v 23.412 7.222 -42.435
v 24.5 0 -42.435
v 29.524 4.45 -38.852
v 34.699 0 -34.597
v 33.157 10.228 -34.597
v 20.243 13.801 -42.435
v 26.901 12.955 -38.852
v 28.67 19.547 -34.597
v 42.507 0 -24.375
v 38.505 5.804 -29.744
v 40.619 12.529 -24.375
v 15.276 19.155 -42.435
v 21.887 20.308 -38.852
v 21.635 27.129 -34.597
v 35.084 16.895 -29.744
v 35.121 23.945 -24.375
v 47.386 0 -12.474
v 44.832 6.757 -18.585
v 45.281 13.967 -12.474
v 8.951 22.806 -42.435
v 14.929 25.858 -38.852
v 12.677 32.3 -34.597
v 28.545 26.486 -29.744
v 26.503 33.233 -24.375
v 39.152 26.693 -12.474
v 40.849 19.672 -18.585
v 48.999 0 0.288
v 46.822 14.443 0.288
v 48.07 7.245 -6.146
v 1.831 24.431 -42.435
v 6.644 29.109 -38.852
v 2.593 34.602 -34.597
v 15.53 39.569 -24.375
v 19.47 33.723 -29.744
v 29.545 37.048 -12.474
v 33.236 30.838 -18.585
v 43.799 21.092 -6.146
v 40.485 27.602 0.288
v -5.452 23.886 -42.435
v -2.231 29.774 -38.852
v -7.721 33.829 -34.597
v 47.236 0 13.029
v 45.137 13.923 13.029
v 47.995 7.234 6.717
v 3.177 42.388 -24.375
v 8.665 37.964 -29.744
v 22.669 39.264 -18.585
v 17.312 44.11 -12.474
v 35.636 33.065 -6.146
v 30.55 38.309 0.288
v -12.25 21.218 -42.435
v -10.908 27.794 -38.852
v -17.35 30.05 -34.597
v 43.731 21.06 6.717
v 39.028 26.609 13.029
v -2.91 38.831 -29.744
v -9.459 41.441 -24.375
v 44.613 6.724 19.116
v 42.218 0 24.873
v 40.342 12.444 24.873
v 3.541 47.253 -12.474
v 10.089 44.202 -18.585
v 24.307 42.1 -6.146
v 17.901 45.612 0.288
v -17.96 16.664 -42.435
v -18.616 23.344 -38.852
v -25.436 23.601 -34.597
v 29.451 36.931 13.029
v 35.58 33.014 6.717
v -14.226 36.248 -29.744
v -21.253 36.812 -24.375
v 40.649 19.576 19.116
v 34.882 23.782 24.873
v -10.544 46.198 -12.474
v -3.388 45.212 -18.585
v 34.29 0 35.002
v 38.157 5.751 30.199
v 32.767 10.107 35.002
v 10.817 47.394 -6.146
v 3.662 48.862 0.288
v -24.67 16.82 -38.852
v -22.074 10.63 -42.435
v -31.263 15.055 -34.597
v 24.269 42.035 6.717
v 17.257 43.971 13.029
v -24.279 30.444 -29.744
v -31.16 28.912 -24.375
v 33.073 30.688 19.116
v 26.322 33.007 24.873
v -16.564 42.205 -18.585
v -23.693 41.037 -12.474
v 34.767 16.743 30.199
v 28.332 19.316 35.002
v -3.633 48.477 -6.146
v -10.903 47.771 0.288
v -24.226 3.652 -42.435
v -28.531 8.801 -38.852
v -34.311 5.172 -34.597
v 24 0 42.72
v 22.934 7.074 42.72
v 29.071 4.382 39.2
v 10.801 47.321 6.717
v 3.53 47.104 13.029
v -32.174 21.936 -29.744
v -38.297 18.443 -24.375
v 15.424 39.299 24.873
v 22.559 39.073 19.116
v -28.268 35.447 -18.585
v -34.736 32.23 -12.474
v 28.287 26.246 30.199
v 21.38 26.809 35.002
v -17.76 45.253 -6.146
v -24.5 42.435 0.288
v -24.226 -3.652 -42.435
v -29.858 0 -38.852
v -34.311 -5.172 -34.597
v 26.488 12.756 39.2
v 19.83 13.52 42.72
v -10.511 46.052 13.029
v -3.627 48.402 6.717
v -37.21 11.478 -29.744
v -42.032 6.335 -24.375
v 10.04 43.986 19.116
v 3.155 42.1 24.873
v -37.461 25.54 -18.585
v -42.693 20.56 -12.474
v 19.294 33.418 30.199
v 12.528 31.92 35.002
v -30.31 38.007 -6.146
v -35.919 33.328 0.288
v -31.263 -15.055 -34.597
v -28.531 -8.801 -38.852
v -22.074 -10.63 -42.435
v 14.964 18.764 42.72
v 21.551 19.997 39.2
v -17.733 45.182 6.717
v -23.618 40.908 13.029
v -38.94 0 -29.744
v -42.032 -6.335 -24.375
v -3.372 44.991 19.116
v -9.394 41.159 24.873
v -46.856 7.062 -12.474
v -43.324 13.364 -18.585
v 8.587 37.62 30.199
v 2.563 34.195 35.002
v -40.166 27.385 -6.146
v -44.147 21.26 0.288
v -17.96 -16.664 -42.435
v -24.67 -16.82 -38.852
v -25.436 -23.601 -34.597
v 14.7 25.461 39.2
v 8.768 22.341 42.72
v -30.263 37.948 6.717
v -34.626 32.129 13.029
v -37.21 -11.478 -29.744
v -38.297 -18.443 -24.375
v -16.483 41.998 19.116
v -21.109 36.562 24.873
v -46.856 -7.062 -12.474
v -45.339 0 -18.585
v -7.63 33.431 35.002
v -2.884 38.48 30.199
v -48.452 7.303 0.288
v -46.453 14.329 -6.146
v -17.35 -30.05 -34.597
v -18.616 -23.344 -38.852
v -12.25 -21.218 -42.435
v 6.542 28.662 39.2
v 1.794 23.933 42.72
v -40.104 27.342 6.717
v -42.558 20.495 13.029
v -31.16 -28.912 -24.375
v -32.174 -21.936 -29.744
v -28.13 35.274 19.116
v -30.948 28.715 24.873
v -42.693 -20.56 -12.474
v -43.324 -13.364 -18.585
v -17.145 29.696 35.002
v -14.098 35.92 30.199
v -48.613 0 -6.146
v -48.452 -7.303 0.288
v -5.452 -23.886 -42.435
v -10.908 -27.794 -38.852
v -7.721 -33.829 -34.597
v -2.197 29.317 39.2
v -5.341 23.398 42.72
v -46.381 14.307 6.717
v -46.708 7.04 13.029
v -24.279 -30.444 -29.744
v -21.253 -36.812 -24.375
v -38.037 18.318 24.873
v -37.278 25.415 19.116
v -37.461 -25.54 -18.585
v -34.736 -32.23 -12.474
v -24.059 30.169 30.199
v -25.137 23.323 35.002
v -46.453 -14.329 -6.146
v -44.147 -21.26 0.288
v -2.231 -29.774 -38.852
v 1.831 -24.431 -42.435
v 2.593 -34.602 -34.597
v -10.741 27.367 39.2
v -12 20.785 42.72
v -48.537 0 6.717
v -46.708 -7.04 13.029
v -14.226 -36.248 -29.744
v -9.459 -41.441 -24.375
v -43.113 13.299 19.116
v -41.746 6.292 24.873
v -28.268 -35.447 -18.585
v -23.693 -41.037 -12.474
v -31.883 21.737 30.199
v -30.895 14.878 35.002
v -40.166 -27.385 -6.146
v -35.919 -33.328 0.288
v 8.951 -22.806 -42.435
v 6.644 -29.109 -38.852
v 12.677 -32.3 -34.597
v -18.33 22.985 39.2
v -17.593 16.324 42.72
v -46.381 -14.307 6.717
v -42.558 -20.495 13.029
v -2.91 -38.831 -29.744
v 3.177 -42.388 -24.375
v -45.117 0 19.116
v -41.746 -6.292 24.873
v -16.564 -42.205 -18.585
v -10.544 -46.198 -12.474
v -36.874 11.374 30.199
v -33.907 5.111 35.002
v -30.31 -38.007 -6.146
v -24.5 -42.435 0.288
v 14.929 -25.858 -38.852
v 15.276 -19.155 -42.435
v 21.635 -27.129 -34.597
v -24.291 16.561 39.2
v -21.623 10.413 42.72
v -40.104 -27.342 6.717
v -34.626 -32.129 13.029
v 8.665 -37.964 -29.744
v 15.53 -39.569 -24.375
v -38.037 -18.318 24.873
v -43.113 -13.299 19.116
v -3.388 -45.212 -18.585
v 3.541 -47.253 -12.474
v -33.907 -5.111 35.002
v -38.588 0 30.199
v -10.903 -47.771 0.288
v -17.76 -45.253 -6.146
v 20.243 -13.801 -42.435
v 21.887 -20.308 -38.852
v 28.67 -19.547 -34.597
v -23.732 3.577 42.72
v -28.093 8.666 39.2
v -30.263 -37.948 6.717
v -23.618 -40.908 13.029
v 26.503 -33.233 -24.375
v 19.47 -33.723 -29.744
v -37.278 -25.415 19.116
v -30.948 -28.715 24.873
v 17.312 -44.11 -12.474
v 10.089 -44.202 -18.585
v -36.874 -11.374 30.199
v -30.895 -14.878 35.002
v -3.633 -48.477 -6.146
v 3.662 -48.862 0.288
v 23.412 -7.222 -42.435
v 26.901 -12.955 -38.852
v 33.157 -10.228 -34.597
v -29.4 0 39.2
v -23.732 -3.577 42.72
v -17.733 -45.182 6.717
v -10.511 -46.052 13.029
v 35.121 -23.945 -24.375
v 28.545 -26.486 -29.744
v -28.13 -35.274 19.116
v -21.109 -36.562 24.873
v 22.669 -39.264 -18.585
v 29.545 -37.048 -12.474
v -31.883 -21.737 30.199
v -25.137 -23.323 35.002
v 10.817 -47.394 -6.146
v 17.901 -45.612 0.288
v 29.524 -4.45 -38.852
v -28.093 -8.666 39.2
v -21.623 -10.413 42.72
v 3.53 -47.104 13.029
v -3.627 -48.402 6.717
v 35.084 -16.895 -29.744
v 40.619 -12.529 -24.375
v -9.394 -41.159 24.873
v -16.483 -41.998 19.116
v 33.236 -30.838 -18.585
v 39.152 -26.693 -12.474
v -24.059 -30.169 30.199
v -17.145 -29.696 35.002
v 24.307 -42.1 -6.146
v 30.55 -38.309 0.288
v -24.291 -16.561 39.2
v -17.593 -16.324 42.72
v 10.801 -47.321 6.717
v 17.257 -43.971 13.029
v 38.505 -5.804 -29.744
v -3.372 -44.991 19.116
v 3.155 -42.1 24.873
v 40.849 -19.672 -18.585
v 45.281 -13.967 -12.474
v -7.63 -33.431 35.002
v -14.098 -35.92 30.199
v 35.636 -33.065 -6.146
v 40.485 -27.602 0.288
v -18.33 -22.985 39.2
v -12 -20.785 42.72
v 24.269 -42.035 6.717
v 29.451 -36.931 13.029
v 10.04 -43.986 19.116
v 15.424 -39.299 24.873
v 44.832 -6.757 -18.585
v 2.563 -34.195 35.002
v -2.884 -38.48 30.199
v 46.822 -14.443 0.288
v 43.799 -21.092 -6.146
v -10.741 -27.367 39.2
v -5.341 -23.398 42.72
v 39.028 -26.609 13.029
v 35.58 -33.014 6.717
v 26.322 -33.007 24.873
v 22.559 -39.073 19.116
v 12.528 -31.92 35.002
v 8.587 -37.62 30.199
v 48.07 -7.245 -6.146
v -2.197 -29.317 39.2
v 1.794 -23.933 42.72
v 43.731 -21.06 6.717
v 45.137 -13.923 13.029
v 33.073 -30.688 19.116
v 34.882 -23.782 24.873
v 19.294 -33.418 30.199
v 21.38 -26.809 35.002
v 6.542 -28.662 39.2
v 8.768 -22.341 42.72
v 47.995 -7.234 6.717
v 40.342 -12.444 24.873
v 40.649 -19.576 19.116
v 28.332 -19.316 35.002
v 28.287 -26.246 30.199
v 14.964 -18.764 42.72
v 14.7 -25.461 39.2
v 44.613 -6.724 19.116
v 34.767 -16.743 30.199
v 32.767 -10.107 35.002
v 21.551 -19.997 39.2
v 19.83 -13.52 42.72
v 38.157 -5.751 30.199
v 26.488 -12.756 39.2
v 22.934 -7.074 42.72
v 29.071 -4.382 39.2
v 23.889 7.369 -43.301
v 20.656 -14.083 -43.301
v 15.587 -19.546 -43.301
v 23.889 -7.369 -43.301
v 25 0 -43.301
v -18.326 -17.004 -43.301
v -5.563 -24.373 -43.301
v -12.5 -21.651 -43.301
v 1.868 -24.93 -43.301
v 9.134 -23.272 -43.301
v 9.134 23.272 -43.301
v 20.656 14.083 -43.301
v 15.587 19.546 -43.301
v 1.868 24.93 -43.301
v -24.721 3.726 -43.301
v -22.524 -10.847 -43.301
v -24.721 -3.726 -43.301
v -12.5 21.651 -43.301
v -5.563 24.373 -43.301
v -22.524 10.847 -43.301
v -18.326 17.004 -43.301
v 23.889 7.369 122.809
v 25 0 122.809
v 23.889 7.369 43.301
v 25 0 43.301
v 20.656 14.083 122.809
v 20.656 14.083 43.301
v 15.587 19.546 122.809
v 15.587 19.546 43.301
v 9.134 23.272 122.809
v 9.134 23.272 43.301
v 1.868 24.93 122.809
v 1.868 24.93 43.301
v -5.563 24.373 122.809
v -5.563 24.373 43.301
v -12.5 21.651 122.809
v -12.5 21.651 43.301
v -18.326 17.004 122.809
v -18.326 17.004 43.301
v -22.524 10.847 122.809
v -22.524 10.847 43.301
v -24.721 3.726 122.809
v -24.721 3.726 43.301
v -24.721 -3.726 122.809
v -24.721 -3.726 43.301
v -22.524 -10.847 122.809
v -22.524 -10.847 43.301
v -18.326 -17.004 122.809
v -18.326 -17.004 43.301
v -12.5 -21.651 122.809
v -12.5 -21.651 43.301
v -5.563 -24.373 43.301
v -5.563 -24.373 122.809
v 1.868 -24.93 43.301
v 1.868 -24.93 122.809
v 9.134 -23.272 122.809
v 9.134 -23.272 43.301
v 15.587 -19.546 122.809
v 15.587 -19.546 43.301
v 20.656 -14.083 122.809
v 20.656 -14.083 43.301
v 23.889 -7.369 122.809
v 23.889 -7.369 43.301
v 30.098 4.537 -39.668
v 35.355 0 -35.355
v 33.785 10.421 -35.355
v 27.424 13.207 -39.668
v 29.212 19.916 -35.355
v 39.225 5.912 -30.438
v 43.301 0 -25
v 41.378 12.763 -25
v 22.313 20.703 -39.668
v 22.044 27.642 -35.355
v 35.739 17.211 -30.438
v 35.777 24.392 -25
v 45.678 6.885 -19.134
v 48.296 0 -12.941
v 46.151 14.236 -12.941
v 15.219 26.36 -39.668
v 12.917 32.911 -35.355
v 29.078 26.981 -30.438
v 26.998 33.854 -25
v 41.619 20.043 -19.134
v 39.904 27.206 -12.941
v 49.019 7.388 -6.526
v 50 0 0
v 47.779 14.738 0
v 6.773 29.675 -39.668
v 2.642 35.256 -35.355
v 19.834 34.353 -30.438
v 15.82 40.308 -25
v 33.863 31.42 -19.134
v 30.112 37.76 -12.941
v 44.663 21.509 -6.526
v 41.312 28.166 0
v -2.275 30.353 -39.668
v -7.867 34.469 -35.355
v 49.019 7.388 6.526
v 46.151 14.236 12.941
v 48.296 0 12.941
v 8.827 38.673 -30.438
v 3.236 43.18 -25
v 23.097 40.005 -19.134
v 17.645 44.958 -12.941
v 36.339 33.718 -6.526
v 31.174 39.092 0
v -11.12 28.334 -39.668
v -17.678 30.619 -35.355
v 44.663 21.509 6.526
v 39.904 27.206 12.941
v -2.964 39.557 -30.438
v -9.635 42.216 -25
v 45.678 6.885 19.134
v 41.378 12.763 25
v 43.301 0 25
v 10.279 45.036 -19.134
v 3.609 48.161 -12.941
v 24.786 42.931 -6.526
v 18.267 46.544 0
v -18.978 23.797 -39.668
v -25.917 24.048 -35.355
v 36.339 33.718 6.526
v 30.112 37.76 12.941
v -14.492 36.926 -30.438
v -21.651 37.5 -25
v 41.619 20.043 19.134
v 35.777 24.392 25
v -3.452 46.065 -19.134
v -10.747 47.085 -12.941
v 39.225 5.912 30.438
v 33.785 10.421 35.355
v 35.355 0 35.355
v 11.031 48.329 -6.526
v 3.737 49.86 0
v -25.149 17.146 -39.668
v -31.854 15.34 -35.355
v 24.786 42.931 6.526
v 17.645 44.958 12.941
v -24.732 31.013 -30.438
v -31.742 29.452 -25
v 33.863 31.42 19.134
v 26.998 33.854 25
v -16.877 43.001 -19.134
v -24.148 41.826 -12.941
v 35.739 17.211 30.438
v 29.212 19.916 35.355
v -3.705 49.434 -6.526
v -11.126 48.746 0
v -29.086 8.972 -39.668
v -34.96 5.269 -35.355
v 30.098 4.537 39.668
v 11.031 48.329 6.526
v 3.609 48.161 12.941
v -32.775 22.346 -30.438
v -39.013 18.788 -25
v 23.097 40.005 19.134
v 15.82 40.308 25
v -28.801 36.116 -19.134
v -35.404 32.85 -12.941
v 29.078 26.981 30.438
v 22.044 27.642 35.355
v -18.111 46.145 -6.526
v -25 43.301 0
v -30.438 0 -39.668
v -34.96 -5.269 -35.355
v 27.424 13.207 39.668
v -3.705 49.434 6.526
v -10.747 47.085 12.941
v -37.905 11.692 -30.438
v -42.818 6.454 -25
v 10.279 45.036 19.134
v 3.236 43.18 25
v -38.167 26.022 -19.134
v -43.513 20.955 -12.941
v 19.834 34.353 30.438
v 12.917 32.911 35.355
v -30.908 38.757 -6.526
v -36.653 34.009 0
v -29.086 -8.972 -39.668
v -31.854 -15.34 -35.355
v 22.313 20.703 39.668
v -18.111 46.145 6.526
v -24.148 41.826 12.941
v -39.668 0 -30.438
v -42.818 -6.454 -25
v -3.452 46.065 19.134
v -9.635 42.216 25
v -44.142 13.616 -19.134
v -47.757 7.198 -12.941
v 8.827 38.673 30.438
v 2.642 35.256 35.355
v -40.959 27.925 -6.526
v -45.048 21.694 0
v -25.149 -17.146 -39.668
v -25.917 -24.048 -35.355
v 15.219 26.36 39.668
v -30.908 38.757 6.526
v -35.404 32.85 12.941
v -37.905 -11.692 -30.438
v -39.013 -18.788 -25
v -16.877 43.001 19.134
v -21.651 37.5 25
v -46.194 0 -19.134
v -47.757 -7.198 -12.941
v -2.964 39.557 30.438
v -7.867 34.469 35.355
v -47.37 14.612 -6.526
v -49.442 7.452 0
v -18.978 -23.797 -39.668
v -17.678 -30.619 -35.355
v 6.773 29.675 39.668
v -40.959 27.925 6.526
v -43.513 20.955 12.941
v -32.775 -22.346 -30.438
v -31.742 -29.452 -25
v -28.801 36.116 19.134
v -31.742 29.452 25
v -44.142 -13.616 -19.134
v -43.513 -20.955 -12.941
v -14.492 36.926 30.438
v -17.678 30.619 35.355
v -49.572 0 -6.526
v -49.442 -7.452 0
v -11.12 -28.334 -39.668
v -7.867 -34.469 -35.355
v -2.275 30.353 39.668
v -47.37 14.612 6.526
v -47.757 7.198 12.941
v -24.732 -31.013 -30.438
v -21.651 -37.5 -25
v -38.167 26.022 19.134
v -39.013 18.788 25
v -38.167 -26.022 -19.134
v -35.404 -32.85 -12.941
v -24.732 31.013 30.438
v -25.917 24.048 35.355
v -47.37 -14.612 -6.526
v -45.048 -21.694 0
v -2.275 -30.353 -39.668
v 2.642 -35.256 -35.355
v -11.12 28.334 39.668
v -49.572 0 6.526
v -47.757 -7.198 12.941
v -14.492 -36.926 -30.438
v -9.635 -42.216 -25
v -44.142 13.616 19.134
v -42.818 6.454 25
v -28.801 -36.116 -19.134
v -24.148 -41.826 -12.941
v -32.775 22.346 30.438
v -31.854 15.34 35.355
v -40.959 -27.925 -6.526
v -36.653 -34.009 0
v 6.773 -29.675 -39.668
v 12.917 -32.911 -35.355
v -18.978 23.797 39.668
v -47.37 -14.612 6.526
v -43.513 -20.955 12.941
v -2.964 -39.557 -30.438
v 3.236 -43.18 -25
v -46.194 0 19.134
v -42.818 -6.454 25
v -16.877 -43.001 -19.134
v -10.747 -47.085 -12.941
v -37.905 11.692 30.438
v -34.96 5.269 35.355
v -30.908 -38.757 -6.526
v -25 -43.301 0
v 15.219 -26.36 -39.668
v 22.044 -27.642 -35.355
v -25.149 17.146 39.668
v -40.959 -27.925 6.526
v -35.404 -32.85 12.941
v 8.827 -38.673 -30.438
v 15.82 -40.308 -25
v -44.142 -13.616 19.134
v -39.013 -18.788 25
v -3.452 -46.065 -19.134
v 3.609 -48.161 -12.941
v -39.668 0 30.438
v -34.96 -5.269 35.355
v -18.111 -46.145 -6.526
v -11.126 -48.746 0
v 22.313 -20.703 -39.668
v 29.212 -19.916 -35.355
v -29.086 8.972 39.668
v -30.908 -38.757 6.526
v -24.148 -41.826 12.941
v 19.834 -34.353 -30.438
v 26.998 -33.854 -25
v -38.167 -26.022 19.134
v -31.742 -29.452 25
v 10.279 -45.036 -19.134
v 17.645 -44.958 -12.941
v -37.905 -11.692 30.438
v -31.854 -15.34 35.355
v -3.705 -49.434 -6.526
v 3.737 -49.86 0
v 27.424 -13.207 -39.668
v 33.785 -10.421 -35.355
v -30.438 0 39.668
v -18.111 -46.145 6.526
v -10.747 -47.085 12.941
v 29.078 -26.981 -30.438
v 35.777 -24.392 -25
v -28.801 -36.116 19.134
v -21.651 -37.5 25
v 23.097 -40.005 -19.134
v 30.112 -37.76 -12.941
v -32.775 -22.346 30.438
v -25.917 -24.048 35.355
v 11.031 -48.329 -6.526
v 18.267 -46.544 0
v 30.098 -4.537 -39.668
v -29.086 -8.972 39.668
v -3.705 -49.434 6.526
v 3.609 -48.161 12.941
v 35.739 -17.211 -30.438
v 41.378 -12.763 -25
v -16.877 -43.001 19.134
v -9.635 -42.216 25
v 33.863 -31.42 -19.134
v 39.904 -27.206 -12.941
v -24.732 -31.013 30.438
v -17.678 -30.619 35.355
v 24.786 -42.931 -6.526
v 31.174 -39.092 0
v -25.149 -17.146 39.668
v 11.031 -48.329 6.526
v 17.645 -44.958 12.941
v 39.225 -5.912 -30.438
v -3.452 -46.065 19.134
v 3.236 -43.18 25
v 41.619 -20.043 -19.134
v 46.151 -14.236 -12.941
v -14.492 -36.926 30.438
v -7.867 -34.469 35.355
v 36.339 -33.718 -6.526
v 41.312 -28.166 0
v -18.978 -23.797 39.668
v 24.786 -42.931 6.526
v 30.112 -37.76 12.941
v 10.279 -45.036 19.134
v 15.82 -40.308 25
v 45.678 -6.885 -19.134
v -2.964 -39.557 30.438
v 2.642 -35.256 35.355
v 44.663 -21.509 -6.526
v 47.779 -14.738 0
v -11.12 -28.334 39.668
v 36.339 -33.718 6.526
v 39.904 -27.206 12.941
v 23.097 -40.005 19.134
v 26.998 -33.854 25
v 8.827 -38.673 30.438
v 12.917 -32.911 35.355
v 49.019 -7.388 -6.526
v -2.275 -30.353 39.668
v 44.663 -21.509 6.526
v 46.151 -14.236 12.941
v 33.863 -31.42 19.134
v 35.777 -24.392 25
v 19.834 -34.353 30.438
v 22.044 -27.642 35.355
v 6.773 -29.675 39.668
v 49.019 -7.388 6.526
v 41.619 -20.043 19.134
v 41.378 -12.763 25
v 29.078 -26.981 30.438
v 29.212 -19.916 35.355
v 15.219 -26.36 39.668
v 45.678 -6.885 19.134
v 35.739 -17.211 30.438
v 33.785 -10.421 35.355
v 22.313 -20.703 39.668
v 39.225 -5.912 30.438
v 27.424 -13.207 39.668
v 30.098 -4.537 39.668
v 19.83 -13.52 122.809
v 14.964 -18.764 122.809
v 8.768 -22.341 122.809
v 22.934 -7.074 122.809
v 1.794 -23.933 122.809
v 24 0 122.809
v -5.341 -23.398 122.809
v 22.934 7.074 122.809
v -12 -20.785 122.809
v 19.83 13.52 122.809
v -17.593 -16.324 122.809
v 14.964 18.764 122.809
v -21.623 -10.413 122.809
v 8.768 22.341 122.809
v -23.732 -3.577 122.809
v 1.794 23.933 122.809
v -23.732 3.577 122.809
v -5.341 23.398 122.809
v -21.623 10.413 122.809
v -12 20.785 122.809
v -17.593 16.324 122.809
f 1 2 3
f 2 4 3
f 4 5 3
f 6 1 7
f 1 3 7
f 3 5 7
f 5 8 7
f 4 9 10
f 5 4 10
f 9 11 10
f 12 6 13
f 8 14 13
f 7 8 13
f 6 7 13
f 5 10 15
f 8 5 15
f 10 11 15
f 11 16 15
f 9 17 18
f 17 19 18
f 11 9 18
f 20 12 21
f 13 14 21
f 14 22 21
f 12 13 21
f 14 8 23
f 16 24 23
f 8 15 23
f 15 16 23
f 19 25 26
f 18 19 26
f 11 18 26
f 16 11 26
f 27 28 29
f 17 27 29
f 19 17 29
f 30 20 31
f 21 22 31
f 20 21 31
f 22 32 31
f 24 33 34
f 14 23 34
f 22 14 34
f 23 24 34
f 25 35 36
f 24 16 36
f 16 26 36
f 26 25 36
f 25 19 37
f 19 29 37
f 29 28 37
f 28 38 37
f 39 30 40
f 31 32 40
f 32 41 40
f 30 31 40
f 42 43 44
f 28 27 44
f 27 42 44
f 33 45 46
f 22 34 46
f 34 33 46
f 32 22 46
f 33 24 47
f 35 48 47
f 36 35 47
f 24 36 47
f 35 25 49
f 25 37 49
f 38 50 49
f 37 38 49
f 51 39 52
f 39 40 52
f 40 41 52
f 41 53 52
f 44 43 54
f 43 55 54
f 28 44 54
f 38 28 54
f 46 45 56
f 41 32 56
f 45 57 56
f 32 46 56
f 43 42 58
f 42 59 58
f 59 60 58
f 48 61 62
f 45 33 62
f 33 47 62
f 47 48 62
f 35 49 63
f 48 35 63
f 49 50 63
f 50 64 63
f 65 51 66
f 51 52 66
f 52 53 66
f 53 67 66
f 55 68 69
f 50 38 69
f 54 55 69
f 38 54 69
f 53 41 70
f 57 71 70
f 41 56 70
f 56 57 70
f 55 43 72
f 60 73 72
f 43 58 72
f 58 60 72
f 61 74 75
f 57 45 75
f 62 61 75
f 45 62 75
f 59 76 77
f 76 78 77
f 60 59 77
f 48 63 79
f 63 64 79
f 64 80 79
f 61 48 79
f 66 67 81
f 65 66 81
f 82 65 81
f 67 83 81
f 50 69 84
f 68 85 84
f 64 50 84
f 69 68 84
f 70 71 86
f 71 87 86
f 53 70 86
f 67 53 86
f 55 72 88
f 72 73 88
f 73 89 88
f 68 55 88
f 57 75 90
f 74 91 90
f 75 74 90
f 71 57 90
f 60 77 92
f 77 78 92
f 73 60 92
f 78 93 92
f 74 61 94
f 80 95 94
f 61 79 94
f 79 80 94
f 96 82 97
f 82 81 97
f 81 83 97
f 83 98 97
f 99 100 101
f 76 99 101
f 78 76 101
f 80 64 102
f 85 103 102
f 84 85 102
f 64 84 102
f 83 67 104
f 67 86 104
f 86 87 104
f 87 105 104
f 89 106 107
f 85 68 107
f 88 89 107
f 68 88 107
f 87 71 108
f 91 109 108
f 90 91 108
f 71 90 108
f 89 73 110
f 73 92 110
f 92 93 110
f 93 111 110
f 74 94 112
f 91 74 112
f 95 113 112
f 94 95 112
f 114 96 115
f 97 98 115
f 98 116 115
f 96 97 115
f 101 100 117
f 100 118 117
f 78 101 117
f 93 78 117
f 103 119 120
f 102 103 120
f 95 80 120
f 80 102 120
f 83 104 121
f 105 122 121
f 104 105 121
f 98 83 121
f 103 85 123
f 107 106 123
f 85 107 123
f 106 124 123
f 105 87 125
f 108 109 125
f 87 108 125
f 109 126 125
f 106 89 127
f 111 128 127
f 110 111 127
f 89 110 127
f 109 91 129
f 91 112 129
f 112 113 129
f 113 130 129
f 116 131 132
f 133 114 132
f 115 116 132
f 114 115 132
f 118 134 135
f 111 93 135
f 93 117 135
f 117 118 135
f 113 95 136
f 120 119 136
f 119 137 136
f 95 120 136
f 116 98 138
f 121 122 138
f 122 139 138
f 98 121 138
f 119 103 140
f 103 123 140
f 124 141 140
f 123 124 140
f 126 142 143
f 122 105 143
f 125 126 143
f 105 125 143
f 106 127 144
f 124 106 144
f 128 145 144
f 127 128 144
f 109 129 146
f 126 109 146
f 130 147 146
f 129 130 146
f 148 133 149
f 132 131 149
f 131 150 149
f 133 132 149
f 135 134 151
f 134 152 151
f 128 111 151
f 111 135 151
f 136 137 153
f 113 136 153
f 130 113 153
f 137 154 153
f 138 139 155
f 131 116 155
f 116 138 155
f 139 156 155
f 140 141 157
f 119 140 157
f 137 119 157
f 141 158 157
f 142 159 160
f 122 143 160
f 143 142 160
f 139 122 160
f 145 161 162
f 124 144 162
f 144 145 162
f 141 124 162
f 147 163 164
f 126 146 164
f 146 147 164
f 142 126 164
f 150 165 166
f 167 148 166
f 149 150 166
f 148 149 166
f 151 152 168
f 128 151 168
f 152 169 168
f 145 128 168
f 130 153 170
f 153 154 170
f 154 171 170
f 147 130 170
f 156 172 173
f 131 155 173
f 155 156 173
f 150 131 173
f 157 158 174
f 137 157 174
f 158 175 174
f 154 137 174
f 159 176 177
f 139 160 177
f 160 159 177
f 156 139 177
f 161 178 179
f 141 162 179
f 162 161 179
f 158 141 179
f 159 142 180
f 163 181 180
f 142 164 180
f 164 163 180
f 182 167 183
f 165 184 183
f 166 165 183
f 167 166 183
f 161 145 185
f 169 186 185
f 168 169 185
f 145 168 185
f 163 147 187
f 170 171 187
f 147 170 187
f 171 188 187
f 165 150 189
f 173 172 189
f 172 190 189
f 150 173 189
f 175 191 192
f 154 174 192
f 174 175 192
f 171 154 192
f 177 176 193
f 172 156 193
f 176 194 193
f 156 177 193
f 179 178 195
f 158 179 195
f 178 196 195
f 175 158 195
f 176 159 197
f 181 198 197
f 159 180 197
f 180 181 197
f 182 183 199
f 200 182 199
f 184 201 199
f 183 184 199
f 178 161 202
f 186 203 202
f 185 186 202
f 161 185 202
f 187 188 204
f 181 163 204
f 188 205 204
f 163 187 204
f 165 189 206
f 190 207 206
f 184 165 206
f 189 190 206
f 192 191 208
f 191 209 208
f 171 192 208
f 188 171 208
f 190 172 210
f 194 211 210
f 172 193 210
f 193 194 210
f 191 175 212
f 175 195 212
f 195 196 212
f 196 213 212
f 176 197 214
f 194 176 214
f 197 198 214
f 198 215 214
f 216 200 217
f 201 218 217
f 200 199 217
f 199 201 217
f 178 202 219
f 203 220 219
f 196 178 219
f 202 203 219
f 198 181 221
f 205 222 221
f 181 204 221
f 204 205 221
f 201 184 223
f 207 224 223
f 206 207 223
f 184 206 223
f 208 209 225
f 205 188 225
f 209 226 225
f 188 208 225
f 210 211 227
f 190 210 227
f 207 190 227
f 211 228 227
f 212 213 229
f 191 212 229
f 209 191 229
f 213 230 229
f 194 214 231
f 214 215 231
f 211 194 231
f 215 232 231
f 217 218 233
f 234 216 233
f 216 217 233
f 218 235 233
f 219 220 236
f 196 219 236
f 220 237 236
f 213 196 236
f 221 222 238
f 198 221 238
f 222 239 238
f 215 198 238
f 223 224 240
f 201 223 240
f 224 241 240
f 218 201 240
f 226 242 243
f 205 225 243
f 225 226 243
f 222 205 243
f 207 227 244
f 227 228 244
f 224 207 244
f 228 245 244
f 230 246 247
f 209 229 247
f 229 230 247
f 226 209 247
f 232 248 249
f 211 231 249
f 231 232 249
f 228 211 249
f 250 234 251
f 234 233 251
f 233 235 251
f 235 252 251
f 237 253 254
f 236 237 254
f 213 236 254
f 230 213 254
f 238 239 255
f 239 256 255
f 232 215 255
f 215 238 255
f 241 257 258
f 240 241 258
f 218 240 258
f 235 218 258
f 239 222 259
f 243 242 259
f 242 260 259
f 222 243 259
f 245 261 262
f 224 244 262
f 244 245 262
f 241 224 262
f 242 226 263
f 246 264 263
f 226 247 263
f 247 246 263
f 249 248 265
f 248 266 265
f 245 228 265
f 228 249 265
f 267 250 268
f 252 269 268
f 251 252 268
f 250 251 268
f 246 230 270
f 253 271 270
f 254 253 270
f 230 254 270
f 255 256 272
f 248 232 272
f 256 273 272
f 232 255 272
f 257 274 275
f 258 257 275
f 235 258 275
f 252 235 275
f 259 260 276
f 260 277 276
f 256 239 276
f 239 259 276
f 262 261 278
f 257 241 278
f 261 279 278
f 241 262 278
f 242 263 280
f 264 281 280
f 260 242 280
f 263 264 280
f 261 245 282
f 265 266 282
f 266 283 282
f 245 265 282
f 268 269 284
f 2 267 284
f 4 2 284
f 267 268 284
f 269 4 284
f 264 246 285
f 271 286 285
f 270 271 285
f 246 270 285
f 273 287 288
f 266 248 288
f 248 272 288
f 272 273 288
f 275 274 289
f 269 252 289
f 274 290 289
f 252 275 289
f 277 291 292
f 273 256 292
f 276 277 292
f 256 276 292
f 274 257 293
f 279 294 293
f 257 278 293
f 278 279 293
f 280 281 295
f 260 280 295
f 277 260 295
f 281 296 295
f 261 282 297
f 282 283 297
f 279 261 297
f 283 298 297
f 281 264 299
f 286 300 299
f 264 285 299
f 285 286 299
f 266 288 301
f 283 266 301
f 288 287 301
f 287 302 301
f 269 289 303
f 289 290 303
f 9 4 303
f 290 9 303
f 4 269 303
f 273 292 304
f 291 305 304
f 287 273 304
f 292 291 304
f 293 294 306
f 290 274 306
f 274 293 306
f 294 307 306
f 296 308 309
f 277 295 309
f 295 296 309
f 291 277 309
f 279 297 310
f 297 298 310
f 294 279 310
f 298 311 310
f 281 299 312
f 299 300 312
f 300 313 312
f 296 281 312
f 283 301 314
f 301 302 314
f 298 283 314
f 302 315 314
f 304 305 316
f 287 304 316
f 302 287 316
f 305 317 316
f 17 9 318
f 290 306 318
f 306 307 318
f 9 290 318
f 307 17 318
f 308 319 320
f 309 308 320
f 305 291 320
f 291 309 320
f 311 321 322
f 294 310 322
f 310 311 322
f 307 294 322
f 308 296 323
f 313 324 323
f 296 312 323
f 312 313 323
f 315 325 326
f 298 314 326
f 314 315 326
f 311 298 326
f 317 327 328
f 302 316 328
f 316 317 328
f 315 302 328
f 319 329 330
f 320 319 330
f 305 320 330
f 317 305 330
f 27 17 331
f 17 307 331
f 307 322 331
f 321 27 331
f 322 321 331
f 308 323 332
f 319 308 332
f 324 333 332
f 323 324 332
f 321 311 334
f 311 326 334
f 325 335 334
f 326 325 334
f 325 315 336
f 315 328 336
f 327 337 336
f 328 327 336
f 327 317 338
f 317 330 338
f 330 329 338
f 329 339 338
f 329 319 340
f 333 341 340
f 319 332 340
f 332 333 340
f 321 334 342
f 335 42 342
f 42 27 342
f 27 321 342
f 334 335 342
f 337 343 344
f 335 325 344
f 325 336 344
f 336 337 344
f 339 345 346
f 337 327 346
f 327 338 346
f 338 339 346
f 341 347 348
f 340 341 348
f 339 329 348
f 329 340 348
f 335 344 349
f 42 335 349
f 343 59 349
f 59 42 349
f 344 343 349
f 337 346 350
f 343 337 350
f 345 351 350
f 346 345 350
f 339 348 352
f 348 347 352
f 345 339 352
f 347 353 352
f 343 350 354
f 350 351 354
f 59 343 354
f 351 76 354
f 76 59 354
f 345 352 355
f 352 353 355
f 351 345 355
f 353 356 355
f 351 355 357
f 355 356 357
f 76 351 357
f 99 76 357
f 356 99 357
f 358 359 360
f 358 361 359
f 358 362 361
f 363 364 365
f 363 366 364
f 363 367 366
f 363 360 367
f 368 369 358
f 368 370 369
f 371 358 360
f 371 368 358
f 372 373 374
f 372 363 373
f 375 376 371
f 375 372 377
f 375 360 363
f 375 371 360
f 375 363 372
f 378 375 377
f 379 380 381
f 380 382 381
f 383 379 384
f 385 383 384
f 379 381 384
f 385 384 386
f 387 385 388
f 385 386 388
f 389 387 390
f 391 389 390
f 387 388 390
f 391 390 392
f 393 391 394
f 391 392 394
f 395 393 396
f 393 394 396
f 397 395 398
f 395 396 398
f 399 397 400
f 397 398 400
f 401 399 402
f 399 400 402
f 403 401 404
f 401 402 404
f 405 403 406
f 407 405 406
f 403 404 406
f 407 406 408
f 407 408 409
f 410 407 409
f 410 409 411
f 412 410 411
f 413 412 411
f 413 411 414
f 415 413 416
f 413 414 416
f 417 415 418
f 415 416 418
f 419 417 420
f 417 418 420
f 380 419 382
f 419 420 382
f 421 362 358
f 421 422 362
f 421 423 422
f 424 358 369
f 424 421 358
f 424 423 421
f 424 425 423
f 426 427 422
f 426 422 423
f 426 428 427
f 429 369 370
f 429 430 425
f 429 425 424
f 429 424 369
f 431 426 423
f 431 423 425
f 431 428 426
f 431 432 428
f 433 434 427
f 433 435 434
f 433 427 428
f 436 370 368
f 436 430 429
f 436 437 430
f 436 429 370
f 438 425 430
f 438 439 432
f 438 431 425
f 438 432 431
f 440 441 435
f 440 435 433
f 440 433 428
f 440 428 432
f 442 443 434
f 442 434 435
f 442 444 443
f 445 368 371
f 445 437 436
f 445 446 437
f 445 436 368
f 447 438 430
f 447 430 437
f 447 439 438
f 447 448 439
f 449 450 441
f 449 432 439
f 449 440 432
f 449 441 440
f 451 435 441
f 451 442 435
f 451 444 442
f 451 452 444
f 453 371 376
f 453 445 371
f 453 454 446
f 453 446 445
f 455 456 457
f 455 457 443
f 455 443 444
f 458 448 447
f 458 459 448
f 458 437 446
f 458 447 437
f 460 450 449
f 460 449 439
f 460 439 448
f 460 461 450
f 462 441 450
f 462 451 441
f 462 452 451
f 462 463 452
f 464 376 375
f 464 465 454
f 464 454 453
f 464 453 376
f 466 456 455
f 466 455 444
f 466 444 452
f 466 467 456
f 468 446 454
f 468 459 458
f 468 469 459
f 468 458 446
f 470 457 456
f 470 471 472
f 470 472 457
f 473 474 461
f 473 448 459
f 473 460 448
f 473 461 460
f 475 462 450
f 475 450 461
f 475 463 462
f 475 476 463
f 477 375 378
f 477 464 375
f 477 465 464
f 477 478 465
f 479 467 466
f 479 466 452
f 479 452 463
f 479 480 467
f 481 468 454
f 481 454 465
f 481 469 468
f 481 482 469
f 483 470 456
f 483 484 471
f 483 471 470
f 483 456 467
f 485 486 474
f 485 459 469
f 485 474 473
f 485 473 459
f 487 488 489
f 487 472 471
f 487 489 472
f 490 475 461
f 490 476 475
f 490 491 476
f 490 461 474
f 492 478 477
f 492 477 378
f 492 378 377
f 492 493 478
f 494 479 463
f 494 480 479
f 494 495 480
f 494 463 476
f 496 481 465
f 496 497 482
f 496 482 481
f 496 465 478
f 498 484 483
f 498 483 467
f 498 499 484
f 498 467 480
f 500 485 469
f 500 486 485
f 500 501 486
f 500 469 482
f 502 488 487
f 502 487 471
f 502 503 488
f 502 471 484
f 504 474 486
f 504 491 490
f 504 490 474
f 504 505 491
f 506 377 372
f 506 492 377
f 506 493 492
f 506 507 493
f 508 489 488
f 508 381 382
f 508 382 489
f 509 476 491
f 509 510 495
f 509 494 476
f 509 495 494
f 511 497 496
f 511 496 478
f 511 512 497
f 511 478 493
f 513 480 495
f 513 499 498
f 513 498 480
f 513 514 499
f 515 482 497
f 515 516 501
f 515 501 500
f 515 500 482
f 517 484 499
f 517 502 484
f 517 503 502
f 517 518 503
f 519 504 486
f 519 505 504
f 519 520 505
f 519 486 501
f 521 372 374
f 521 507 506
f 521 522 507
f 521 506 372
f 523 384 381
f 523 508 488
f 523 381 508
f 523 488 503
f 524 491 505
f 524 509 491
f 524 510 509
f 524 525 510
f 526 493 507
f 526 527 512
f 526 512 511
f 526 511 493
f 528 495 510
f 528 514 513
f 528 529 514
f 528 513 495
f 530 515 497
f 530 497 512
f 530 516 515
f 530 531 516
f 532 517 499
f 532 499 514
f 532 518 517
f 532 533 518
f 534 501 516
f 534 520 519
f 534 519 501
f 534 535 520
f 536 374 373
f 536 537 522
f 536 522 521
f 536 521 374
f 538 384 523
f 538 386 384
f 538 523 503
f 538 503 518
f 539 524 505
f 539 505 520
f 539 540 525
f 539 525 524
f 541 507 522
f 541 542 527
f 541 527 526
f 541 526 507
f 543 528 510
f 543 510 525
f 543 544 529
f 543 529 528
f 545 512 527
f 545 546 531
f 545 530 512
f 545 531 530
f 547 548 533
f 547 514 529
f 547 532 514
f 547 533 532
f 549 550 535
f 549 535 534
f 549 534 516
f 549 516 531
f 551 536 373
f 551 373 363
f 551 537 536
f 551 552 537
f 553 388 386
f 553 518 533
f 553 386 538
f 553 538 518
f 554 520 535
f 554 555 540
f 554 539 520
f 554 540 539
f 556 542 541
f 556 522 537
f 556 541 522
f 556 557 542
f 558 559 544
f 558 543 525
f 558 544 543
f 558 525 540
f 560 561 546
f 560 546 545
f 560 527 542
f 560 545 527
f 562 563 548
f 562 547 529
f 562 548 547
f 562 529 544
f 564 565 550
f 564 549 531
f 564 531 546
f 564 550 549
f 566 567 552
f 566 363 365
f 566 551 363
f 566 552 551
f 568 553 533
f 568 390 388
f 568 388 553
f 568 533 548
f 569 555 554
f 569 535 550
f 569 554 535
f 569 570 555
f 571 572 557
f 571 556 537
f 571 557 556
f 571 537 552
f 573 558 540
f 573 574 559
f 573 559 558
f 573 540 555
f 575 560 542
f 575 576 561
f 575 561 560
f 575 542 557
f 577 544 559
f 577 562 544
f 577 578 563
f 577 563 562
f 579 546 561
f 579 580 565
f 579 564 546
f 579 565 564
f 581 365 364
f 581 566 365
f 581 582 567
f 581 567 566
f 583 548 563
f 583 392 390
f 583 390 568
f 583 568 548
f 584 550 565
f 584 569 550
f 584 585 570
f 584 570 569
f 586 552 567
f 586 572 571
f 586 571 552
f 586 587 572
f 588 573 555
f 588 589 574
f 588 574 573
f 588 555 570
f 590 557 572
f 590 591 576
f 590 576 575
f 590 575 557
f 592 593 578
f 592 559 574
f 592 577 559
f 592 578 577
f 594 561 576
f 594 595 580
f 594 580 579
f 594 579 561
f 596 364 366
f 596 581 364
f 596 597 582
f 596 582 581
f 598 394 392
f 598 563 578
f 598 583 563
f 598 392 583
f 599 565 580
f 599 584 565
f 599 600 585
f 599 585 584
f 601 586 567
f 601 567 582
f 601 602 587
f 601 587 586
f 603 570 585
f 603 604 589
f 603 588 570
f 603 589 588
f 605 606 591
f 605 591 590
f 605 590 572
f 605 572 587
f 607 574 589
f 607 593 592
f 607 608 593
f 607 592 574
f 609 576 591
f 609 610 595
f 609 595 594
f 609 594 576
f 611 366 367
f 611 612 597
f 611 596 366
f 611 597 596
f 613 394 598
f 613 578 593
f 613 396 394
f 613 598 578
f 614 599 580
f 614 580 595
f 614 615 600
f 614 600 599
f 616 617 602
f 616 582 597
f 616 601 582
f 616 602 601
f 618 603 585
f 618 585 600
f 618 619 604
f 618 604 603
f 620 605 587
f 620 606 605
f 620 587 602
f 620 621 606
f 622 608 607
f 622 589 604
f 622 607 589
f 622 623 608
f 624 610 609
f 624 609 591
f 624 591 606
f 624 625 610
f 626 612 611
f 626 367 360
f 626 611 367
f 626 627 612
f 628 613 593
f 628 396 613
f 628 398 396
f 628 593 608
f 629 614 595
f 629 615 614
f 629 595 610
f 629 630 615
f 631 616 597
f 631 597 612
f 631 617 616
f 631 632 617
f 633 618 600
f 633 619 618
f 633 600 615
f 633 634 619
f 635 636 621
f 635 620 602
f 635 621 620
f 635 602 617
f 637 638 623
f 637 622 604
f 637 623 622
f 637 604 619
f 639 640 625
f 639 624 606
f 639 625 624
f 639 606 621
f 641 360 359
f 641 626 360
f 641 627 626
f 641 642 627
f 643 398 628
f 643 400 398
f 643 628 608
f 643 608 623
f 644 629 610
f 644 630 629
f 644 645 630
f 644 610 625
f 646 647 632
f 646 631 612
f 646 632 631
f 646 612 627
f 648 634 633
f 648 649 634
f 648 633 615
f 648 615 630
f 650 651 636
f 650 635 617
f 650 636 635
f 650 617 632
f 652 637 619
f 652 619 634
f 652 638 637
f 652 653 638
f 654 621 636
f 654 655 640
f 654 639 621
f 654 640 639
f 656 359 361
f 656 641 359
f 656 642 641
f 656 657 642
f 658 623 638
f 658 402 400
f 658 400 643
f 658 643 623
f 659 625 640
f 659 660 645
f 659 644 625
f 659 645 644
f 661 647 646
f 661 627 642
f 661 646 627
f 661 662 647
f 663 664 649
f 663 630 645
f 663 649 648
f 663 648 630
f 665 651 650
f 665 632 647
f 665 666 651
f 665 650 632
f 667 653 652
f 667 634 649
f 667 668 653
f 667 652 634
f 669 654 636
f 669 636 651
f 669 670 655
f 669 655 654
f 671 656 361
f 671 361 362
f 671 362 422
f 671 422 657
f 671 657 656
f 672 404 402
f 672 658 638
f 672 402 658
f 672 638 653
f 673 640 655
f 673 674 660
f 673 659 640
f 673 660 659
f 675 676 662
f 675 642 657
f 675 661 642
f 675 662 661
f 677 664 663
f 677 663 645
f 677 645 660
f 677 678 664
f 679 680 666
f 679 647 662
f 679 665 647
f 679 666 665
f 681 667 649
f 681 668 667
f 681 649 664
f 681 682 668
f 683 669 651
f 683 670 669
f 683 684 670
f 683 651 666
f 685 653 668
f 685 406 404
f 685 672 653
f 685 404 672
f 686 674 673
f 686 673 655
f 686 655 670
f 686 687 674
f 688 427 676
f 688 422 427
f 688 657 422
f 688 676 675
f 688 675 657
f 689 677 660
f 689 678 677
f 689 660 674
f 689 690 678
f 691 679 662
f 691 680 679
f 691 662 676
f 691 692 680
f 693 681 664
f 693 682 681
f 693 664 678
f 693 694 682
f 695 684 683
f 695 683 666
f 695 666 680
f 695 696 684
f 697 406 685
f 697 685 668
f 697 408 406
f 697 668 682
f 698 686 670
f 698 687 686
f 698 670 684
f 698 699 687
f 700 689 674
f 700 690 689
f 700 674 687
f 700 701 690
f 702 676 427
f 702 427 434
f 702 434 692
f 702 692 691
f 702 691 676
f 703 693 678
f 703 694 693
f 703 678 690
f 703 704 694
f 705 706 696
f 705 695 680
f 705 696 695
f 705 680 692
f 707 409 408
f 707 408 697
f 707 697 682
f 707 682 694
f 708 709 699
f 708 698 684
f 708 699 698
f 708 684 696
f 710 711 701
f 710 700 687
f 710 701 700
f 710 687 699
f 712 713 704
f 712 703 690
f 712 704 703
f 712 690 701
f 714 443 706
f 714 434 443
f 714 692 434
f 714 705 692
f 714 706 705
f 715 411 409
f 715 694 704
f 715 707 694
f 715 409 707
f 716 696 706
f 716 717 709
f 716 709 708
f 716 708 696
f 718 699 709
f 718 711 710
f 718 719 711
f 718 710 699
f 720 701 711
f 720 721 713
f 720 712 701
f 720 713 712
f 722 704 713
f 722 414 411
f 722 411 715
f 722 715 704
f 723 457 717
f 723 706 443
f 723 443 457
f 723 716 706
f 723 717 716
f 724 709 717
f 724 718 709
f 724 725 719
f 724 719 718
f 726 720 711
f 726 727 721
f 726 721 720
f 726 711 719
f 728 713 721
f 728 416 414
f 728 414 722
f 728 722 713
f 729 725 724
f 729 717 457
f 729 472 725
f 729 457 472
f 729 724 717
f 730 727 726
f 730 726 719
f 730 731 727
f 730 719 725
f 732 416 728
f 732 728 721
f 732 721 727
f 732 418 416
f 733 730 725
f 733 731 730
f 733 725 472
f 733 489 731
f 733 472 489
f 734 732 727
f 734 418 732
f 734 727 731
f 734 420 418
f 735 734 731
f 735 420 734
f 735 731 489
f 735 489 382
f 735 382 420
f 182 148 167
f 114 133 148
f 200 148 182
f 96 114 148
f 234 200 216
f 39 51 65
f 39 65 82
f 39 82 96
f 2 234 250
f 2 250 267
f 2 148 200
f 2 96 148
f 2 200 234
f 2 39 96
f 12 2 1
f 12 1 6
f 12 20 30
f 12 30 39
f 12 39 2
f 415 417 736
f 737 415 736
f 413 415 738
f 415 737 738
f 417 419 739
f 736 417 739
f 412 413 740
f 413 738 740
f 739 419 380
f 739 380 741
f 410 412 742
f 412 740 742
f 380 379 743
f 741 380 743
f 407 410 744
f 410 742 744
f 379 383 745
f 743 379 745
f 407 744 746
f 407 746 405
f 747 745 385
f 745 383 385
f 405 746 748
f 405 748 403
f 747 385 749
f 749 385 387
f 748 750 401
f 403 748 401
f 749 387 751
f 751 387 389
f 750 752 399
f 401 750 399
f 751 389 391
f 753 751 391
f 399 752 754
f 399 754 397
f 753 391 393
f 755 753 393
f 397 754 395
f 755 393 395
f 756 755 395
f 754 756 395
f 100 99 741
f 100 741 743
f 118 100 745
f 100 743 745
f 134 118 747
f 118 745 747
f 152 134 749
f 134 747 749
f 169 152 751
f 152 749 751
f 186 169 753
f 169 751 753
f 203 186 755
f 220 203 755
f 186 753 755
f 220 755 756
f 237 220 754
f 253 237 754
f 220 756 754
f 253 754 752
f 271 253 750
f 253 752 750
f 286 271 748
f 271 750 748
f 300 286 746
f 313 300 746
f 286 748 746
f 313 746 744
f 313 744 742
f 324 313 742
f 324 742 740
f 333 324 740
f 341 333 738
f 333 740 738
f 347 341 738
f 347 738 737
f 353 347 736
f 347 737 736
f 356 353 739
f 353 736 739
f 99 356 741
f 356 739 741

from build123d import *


with BuildPart() as part:
    # Sketch → Revolve (revolve)
    with BuildSketch(Plane.XZ):
        with BuildLine():
            ThreePointArc((25, -43.30127), (50, 0), (25, 43.30127))
            Line((25, 122.809067), (25, 43.30127))
            Line((24, 122.809067), (25, 122.809067))
            Line((24, 42.720019), (24, 122.809067))
            ThreePointArc((24.5, -42.435245), (48.999155, 0.287705), (24, 42.720019))
            Line((24.5, -42.435245), (0, -42.435245))
            Line((0, -42.435245), (0, -43.30127))
            Line((0, -43.30127), (25, -43.30127))
        make_face()
    revolve(axis=Axis((0, 0, 0), (0, 0, 1)))


solid = part.part
